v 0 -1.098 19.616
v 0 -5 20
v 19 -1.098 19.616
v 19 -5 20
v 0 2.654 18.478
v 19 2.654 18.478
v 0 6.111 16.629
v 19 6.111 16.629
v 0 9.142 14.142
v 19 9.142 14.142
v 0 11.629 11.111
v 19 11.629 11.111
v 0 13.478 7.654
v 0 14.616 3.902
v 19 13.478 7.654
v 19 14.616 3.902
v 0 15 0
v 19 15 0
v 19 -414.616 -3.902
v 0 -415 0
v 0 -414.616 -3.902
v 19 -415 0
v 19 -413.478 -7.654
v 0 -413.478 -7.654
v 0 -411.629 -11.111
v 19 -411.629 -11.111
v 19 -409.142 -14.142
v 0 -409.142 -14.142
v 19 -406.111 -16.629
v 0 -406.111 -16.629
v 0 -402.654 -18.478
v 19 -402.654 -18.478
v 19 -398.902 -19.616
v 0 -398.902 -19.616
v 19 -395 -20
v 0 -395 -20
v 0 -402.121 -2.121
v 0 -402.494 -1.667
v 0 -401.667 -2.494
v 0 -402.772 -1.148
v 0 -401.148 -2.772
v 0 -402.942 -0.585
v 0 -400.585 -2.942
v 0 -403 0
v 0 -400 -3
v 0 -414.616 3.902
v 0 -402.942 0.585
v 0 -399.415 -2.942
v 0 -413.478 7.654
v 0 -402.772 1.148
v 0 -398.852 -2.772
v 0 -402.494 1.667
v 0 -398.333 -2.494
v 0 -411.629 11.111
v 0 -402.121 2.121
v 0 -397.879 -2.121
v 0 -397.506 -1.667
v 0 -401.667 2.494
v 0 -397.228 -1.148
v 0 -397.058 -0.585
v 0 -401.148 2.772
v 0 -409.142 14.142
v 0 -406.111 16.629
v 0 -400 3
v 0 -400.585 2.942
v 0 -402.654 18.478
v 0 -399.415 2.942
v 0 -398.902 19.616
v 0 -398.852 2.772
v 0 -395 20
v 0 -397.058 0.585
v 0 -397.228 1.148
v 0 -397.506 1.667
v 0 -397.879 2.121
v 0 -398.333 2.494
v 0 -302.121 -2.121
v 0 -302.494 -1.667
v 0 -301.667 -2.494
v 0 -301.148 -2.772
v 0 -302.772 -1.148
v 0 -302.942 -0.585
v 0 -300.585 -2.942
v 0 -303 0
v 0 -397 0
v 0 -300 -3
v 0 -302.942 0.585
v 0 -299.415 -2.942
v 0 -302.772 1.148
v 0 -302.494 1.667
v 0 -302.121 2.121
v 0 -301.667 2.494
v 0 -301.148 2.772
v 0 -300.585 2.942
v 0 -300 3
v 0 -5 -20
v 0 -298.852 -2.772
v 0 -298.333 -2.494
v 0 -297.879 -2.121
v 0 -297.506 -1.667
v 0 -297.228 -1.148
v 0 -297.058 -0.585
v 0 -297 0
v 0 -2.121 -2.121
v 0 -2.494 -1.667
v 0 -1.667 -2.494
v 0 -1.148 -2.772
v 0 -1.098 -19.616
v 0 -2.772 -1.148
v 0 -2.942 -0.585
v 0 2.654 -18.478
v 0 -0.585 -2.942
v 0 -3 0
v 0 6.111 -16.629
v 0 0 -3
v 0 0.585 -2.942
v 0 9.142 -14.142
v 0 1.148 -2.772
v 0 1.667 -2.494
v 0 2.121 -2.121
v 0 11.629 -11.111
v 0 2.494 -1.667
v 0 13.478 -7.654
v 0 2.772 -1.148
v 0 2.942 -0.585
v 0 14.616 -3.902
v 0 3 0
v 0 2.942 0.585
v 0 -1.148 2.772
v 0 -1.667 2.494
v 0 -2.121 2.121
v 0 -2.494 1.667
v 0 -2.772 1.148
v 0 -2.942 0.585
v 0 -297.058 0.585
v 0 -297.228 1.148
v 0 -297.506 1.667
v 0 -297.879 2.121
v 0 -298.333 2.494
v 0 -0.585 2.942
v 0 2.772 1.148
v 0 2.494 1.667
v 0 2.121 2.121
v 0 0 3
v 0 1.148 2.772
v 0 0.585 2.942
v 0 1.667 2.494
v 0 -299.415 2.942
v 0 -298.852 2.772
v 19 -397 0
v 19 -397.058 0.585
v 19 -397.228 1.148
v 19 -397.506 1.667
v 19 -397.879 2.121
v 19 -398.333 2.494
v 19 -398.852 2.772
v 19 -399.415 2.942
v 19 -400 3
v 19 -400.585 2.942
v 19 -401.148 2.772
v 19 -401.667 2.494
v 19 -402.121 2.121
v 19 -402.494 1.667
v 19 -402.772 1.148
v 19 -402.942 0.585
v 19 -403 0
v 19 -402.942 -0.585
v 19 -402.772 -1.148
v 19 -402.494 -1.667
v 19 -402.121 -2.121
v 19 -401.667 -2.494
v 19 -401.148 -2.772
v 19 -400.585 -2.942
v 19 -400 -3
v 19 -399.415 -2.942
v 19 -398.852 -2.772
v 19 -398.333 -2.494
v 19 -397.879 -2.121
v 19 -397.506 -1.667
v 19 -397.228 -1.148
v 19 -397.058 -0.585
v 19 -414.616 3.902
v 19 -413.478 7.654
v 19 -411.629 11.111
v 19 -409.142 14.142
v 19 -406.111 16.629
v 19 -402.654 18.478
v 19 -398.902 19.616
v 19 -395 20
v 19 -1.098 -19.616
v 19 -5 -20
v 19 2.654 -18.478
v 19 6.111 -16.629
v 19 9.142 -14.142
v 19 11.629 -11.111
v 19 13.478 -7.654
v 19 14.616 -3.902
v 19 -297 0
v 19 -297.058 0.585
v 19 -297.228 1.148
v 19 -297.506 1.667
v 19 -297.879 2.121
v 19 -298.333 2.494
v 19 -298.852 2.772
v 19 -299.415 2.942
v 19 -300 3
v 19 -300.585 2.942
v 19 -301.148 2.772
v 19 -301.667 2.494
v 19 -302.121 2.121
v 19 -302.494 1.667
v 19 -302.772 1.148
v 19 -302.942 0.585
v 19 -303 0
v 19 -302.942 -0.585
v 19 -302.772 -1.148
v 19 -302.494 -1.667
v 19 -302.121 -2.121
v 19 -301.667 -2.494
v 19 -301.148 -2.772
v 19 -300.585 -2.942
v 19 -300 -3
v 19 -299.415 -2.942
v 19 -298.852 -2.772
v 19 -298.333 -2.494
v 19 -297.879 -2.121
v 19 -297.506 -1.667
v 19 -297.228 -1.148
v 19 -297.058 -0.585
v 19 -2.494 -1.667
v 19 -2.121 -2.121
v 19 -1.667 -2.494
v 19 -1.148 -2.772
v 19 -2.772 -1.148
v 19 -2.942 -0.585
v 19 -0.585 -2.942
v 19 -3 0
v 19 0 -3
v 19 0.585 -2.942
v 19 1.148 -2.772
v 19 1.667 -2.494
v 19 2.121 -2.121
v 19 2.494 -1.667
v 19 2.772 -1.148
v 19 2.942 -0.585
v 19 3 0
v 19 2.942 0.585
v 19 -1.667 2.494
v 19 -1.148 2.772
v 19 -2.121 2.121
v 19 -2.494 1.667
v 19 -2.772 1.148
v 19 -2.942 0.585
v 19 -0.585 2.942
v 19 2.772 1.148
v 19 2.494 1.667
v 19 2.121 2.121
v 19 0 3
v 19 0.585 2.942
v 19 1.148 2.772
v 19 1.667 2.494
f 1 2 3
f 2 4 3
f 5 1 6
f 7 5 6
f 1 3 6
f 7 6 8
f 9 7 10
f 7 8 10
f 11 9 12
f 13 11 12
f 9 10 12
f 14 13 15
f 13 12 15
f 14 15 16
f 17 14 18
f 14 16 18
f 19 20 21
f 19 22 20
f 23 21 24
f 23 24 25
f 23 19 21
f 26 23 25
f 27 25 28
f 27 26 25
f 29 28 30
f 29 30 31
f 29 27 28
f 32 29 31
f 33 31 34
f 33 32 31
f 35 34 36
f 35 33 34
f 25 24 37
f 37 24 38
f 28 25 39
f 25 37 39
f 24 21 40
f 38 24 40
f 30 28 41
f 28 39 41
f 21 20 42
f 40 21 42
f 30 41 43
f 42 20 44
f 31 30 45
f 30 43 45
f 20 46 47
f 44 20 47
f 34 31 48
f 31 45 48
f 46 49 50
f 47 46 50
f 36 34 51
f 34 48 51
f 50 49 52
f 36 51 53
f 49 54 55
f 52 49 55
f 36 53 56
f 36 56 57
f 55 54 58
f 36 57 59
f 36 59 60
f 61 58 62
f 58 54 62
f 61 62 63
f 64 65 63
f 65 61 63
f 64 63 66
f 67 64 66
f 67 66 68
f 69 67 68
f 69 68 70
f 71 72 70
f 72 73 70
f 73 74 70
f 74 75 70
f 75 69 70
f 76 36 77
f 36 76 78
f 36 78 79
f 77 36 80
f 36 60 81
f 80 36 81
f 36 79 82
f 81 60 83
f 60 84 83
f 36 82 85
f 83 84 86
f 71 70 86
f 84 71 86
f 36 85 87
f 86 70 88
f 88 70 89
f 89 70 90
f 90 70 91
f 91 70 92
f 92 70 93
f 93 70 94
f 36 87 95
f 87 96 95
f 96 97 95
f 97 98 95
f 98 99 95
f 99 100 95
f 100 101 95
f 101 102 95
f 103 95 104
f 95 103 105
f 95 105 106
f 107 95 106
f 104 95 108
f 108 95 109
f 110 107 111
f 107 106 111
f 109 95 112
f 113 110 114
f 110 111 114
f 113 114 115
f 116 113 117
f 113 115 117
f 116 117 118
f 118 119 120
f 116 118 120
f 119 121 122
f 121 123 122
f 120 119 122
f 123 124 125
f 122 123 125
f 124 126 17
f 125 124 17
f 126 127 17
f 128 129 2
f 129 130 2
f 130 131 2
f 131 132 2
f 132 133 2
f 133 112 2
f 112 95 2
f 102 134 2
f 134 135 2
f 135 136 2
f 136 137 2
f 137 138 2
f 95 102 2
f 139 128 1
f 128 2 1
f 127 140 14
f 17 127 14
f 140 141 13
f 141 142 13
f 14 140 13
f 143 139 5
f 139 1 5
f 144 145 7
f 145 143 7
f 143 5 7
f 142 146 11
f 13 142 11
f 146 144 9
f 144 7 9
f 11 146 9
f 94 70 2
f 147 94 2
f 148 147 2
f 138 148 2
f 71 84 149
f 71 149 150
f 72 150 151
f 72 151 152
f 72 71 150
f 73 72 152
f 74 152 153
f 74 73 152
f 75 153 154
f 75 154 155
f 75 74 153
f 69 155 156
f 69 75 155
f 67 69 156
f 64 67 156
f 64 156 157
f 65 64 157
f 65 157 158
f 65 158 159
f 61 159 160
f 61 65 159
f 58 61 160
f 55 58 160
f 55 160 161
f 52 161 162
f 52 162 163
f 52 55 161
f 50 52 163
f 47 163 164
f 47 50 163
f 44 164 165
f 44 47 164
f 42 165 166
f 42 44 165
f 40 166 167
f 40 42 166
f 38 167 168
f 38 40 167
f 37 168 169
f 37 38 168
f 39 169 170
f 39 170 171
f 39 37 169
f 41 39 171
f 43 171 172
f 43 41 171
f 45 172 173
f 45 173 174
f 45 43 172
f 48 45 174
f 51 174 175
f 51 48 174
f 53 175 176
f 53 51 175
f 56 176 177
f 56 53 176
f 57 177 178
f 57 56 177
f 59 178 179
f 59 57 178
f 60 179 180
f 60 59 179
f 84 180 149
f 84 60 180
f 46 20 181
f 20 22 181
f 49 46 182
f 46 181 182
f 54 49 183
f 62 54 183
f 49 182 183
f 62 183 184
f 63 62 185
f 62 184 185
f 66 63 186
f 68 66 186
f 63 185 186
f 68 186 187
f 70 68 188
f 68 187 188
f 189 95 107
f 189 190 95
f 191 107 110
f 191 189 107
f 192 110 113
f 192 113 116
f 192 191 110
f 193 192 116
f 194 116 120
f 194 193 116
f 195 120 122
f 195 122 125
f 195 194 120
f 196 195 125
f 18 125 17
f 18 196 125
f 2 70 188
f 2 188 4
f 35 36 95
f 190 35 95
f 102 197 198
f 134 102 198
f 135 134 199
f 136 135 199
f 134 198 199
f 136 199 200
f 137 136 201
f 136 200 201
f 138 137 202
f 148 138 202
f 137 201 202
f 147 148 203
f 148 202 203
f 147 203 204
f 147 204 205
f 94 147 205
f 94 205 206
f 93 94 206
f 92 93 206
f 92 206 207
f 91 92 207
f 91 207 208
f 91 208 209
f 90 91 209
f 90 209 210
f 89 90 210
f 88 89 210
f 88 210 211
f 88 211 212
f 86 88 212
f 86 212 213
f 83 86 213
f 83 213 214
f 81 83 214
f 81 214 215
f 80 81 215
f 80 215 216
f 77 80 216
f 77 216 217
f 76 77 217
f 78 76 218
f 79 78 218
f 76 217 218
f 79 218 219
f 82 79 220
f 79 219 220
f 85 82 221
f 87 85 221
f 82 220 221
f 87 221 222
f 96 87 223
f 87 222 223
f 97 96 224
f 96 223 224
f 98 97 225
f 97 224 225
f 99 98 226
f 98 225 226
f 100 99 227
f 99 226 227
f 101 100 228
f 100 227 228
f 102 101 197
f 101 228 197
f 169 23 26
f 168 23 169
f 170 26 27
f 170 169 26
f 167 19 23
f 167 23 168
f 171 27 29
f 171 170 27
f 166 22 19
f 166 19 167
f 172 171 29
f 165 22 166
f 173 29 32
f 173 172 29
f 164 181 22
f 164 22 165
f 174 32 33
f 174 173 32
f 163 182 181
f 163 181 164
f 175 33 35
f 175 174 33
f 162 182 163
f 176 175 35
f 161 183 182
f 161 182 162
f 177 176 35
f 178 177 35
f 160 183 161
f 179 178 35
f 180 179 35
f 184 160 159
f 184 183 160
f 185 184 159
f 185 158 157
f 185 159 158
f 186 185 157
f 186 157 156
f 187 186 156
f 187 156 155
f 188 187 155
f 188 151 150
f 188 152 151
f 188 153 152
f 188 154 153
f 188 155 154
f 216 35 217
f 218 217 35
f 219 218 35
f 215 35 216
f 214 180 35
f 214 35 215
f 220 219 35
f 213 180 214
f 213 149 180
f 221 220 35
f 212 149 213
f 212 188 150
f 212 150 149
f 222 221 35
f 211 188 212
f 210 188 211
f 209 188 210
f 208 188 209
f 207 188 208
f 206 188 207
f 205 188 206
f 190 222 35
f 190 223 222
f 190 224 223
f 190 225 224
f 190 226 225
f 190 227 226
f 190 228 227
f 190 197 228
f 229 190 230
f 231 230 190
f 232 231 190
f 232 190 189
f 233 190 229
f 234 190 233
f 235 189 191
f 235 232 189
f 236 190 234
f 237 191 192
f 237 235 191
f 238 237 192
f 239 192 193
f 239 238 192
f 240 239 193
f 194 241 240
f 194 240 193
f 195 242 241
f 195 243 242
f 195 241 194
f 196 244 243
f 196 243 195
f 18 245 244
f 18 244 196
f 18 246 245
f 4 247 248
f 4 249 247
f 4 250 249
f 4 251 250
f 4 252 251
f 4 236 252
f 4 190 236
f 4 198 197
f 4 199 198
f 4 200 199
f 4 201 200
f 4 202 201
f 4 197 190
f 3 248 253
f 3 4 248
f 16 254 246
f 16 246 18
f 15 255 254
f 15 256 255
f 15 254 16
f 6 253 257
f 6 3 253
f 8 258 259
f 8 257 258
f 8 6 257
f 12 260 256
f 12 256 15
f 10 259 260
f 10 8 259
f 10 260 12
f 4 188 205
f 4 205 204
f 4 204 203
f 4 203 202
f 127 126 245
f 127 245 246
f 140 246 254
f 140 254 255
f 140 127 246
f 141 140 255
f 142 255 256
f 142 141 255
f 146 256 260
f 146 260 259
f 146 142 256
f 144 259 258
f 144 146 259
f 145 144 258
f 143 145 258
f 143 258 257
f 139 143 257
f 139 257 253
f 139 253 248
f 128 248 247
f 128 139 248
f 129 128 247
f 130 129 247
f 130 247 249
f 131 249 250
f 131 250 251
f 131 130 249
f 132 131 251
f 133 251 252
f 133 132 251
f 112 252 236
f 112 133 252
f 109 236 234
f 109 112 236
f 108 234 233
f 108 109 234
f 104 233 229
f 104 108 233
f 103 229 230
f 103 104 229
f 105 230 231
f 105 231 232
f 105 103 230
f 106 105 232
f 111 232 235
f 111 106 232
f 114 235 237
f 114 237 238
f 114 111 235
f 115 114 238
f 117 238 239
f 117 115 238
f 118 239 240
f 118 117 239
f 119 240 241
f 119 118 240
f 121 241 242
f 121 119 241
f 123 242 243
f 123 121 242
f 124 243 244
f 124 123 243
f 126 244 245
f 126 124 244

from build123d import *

# Parameters (mm, degrees)
F0_W     = 430
F0_H     = 40
F0_R     = 3
F1_DEPTH = 19
F2_R     = 19.99999
F3_R     = 3
F4_DEPTH = 19.001


# Not quite as in the source:
# - a fillet or chamfer is up to 0.001 mm smaller than in the source, because OpenCascade refuses the exact size


with BuildPart() as f1:
    # F0 (on Right) → F1 (new body)
    with BuildSketch(Plane.YZ):
        with Locations((-200, 0)):
            Rectangle(F0_W, F0_H)
        with Locations((-400, 0)):
            Circle(F0_R, mode=Mode.SUBTRACT)
        Circle(F0_R, mode=Mode.SUBTRACT)
    extrude(amount=F1_DEPTH)

    # F2 (radius 20 in the source; OpenCascade refuses exactly that, so slightly less here)
    f2_edges = [f1.edges().sort_by_distance(p)[0] for p in [
        (9.5, 15, 20),
        (9.5, 15, -20),
        (9.5, -415, 20),
        (9.5, -415, -20),
    ]]
    fillet(f2_edges, radius=F2_R)

    # F3 (on face) → F4 (cut, through all)
    with BuildSketch(Plane.YZ.offset(19)):
        with Locations((-300, 0)):
            Circle(F3_R)
    extrude(amount=-F4_DEPTH, mode=Mode.SUBTRACT)


solid = f1.part
